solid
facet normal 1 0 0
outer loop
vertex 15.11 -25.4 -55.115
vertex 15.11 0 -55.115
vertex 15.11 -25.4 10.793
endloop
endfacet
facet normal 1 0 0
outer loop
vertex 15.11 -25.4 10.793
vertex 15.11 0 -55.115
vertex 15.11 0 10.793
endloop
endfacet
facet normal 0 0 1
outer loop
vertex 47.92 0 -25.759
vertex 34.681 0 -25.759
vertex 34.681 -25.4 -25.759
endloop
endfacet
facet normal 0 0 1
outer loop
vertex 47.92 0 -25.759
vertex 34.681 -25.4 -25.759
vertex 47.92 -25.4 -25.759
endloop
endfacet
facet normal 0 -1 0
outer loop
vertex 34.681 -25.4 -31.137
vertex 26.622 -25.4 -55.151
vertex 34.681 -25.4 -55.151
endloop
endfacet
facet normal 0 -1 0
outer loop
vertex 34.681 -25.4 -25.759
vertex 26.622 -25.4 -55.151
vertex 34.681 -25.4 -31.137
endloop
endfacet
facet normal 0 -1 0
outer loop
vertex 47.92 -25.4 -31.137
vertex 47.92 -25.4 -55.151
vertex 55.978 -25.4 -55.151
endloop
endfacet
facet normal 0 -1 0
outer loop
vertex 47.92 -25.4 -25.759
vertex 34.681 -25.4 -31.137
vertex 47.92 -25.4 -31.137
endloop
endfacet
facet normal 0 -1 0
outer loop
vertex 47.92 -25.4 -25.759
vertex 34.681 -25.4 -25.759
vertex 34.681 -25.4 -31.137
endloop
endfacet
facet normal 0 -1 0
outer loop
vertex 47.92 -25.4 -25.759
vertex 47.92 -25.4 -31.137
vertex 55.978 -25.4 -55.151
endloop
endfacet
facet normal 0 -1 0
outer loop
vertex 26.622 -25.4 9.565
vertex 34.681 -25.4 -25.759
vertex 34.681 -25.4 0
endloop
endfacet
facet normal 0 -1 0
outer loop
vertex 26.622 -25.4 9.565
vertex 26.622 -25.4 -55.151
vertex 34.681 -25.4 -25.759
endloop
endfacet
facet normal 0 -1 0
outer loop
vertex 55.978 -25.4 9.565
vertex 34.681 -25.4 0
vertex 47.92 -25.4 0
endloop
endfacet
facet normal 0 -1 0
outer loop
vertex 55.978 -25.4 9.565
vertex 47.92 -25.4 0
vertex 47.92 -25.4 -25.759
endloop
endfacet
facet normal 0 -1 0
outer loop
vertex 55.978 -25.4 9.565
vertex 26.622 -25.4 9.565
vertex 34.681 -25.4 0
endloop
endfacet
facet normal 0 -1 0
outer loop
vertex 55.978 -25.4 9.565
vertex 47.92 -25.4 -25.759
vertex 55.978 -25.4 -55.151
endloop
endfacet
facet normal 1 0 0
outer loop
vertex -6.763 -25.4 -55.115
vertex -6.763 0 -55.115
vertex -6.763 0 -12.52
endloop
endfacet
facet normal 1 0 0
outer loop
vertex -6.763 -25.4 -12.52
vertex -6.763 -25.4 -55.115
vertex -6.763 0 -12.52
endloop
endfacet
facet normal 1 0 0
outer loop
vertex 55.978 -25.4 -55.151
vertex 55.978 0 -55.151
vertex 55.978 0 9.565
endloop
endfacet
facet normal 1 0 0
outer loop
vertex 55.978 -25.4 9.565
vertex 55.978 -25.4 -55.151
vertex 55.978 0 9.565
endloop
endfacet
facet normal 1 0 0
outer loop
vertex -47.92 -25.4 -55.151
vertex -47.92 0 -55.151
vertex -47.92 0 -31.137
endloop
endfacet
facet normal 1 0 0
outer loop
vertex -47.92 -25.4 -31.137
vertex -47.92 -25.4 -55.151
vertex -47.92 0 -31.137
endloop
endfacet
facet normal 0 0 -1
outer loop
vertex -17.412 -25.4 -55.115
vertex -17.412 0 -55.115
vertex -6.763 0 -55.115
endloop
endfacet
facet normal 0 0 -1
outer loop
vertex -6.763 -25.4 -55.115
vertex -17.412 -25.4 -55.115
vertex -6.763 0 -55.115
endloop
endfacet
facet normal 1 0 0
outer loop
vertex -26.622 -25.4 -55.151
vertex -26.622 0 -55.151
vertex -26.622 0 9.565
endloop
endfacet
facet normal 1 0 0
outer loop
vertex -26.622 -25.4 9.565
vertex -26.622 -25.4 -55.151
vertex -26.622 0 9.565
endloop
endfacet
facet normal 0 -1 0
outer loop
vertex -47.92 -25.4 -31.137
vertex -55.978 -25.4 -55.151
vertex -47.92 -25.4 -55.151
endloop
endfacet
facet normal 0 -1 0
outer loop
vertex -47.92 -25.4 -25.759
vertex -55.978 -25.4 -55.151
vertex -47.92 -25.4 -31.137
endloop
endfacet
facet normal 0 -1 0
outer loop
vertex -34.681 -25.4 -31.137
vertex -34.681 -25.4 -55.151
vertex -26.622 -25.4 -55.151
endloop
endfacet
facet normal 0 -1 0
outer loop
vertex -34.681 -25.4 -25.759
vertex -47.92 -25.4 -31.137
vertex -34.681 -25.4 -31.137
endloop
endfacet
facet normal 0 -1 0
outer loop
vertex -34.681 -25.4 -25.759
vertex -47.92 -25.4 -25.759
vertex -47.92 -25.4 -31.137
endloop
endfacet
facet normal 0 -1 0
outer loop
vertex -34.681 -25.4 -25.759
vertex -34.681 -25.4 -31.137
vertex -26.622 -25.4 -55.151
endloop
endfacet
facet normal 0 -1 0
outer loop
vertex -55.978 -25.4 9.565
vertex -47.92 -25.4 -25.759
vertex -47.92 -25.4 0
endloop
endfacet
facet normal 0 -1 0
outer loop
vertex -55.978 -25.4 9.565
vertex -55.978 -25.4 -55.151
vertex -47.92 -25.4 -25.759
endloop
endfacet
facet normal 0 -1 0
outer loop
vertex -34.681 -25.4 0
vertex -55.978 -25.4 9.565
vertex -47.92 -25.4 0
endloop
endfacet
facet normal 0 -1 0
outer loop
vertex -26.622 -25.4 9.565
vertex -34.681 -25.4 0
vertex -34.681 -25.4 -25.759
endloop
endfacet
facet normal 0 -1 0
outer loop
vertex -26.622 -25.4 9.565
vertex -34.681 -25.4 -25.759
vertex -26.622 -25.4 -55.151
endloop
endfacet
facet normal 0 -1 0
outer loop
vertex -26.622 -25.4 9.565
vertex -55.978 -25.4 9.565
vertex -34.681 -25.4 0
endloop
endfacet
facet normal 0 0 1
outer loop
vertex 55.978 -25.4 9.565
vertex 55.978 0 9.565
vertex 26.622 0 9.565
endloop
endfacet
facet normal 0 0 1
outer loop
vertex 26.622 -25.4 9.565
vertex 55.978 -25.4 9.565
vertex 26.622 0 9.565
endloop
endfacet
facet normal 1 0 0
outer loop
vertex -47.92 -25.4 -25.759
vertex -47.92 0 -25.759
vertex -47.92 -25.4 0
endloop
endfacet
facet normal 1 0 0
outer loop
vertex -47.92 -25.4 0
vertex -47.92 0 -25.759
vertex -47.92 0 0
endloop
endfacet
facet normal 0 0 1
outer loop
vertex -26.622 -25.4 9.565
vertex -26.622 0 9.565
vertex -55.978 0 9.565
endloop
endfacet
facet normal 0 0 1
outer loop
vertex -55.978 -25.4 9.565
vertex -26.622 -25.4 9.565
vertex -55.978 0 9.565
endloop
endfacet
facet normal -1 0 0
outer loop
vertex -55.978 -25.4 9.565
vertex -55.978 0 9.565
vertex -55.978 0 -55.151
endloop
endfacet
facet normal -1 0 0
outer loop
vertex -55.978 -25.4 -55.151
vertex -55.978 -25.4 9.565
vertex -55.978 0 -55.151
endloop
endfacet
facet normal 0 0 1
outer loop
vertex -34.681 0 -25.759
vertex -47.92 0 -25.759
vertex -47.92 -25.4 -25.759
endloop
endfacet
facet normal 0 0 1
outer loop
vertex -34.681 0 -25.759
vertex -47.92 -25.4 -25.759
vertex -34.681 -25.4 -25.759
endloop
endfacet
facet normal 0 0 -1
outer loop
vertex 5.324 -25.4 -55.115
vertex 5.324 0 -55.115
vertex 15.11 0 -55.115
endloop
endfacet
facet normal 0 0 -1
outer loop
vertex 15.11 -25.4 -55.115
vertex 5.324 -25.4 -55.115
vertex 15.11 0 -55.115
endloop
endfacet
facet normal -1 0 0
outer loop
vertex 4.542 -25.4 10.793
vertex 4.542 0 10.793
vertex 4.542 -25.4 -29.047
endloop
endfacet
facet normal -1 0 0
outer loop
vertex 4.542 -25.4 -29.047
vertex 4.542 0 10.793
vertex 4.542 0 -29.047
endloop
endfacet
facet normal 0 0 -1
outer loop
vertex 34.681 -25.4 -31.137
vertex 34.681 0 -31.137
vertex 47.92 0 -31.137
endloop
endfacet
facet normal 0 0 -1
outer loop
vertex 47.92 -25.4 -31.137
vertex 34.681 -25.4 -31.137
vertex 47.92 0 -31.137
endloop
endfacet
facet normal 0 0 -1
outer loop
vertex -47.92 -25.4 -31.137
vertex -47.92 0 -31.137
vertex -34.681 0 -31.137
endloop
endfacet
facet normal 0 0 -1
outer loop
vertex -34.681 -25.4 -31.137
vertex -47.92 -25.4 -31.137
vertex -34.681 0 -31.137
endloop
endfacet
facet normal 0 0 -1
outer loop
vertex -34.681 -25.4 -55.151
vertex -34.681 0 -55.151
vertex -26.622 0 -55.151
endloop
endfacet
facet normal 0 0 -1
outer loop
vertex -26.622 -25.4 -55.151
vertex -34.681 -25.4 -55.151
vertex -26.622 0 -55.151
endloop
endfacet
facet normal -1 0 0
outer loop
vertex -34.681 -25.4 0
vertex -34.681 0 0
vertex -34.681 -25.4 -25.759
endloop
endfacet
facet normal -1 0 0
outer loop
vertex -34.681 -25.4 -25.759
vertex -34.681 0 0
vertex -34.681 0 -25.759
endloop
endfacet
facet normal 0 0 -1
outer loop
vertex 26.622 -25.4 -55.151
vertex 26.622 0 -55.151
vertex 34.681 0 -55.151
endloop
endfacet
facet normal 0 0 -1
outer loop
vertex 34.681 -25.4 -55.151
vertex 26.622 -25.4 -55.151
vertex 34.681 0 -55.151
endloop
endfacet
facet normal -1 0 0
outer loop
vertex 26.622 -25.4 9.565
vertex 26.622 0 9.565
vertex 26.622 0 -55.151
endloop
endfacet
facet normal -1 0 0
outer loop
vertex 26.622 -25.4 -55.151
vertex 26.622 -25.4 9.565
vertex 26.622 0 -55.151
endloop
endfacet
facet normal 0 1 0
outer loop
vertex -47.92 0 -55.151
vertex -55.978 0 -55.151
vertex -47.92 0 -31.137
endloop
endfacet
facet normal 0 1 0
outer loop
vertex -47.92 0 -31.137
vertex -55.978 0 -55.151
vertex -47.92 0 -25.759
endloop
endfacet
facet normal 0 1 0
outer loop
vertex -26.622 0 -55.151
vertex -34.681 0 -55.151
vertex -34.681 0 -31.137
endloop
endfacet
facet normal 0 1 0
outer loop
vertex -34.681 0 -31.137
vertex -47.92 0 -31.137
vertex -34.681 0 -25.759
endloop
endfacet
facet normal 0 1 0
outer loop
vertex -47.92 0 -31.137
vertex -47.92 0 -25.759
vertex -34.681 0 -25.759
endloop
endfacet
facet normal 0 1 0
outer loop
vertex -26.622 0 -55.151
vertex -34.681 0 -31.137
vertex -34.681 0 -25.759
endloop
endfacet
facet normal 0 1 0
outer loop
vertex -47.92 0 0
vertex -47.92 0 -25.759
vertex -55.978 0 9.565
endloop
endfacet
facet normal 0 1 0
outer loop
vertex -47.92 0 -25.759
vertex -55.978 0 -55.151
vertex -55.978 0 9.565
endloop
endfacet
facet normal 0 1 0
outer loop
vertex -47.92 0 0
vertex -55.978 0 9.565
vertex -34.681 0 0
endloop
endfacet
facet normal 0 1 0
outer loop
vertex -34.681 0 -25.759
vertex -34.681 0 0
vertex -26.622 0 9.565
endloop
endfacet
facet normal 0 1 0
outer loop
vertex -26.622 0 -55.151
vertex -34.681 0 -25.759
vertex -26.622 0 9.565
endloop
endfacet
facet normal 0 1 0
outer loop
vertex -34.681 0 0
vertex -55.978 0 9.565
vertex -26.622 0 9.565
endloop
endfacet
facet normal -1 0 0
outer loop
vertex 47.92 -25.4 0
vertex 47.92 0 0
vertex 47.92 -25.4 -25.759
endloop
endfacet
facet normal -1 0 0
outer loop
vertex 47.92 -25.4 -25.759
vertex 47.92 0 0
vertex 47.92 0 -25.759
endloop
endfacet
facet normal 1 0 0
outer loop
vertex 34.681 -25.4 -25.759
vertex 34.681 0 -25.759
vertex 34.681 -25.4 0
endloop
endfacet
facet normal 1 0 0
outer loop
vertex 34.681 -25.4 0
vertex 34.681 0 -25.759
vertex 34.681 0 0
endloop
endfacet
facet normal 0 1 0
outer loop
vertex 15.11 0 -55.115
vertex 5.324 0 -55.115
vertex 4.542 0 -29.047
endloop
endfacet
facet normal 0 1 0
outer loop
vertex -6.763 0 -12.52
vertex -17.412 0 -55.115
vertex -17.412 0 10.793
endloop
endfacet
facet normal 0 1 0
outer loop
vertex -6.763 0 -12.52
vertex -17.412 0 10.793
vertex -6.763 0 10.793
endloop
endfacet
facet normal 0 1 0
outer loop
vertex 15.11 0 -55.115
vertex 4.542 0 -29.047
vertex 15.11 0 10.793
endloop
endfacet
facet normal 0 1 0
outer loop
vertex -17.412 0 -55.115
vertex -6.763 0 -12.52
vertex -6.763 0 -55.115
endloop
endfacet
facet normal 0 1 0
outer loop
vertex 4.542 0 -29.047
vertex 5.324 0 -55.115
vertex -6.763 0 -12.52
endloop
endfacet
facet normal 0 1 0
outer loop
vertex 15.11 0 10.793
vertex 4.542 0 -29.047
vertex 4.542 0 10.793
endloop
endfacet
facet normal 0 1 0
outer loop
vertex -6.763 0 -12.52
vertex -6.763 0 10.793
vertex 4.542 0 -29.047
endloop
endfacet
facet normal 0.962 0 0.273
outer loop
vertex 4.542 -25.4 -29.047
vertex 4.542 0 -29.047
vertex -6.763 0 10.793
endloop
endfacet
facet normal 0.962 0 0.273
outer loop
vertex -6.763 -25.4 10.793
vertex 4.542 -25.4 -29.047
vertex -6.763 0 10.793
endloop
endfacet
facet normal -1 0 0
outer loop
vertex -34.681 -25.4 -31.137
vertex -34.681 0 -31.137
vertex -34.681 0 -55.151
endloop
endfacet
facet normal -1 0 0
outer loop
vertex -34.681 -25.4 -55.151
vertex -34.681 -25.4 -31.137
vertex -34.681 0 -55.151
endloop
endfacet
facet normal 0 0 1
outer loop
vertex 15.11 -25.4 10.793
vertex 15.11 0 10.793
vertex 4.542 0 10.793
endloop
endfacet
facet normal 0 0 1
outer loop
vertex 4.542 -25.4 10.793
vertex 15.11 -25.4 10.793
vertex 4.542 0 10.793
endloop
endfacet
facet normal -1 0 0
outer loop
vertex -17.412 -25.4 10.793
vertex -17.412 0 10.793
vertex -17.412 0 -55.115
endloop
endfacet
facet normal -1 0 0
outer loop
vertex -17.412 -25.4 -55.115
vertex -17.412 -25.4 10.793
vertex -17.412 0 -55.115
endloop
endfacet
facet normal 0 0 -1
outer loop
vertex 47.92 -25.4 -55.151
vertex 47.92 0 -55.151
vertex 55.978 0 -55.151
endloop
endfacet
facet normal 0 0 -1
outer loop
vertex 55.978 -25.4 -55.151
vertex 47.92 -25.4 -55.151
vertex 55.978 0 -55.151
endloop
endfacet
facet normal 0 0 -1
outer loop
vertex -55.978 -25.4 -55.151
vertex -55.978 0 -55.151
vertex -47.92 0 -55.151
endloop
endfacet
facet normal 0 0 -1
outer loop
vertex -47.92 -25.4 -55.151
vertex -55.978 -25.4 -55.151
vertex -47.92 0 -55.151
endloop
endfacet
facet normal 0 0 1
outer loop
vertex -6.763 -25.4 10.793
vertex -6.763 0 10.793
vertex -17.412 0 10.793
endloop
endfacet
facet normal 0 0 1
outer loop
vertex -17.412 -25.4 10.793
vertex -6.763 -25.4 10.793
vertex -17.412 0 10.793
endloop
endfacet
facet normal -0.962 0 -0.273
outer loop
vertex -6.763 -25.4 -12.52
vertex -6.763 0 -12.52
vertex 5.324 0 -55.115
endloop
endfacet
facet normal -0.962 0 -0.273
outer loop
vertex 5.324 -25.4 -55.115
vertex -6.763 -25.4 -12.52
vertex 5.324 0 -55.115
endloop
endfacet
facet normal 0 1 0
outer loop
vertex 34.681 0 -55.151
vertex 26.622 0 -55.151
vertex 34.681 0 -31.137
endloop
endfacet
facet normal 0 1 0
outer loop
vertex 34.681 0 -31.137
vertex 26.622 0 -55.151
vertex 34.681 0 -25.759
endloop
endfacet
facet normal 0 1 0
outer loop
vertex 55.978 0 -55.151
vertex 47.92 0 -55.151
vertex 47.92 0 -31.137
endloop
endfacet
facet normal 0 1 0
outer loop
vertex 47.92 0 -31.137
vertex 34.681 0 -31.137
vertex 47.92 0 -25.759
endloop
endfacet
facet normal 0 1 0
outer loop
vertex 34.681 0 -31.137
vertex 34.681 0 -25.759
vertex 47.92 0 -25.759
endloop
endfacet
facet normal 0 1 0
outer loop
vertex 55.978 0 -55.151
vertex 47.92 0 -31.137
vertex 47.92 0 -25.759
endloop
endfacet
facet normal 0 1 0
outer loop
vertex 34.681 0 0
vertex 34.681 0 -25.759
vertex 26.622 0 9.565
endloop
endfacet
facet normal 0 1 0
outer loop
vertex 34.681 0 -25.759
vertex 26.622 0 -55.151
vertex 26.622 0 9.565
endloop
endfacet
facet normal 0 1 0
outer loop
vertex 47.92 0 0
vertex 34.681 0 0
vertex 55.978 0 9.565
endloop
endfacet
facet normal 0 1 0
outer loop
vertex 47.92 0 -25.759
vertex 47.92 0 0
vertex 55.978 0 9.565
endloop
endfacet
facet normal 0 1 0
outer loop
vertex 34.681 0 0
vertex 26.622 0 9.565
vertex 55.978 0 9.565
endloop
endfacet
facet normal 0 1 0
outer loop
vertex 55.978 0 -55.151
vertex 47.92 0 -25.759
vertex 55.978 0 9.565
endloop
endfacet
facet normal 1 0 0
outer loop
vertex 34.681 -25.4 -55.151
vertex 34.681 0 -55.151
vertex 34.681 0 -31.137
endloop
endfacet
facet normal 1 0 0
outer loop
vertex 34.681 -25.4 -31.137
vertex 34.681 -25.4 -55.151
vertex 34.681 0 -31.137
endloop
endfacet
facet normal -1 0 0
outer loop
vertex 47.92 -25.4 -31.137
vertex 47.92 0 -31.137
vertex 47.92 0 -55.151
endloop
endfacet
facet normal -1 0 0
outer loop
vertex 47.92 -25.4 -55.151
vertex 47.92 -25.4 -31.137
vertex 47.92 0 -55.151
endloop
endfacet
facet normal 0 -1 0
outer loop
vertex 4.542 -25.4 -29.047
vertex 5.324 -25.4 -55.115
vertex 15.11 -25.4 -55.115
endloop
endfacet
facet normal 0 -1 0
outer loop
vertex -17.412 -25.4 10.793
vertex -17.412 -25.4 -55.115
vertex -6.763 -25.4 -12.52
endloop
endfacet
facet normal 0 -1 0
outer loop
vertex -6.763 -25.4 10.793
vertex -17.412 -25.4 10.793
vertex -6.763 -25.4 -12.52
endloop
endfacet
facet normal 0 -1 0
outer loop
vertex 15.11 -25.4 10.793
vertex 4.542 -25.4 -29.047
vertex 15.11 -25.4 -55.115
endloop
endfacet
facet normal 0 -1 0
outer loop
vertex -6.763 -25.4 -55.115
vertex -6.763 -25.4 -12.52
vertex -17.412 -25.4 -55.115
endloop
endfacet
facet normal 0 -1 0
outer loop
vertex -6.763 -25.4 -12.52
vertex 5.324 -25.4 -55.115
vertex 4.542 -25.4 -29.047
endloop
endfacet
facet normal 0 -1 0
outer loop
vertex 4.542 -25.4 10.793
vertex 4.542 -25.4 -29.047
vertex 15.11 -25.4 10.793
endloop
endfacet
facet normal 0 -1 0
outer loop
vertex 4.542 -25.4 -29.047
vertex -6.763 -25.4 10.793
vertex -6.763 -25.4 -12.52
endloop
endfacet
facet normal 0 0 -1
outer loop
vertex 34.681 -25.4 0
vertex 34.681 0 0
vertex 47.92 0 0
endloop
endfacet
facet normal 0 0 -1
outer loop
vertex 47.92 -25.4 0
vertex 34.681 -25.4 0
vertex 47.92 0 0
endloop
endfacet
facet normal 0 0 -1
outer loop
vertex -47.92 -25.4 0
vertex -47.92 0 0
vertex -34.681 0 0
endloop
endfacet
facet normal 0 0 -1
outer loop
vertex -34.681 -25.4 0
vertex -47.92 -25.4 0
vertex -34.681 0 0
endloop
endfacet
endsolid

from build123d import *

# Parameters (mm, degrees)
F0_W     = 13.2390707731
F0_H     = 5.3783226758
F1_DEPTH = 25.4


with BuildPart() as f1:
    # F0 (on Front) → F1 (new body)
    with BuildSketch(Plane.XZ):
        Polygon((-26.622030884, 9.564936161), (-55.9782199562, 9.564936161), (-55.9782199562, -55.1510453224), (-47.9196608067, -55.1510453224), (-47.9196608067, -31.1369374394), (-47.9196608067, -25.7586147636), (-47.9196608067, -7.1228295565), (-47.9196608067, 0), (-34.6805900335, 0), (-34.6805900335, -7.1228295565), (-34.6805900335, -25.7586147636), (-34.6805900335, -31.1369374394), (-34.6805900335, -39.2773151398), (-34.6805900335, -55.1510453224), (-26.622030884, -55.1510453224), align=None)
        with Locations((-41.3001254201, -28.4477761015)):
            Rectangle(F0_W, F0_H)
    extrude(amount=F1_DEPTH)


with BuildPart() as f1b:
    # F0 (on Front) → F1, piece 2 (new body)
    with BuildSketch(Plane.XZ):
        Polygon((-17.4122489989, 10.7927164063), (-17.4122489989, 9.0658813715), (-17.4122489989, 0), (-17.4122489989, -55.1148019731), (-6.7634354346, -55.1148019731), (-6.7634354346, -12.5195495784), (5.3244065493, -55.1148019731), (15.1098025963, -55.1148019731), (15.1098025963, 10.7927164063), (4.5424767993, 10.7927164063), (4.5424767993, -29.0471645083), (-6.7634354346, 10.7927164063), align=None)
    extrude(amount=F1_DEPTH)


with BuildPart() as f1c:
    # F0 (on Front) → F1, piece 3 (new body)
    with BuildSketch(Plane.XZ):
        Polygon((55.9782199562, 9.564936161), (26.622030884, 9.564936161), (26.622030884, -55.1510453224), (34.6805900335, -55.1510453224), (34.6805900335, -31.1369374394), (34.6805900335, -25.7586147636), (34.6805900335, -7.1228295565), (34.6805900335, 0), (47.9196608067, 0), (47.9196608067, -7.1228295565), (47.9196608067, -25.7586147636), (47.9196608067, -31.1369374394), (47.9196608067, -55.1510453224), (55.9782199562, -55.1510453224), align=None)
        with Locations((41.3001254201, -28.4477761015)):
            Rectangle(F0_W, F0_H)
    extrude(amount=F1_DEPTH)


solid = Compound([f1.part, f1b.part, f1c.part])
